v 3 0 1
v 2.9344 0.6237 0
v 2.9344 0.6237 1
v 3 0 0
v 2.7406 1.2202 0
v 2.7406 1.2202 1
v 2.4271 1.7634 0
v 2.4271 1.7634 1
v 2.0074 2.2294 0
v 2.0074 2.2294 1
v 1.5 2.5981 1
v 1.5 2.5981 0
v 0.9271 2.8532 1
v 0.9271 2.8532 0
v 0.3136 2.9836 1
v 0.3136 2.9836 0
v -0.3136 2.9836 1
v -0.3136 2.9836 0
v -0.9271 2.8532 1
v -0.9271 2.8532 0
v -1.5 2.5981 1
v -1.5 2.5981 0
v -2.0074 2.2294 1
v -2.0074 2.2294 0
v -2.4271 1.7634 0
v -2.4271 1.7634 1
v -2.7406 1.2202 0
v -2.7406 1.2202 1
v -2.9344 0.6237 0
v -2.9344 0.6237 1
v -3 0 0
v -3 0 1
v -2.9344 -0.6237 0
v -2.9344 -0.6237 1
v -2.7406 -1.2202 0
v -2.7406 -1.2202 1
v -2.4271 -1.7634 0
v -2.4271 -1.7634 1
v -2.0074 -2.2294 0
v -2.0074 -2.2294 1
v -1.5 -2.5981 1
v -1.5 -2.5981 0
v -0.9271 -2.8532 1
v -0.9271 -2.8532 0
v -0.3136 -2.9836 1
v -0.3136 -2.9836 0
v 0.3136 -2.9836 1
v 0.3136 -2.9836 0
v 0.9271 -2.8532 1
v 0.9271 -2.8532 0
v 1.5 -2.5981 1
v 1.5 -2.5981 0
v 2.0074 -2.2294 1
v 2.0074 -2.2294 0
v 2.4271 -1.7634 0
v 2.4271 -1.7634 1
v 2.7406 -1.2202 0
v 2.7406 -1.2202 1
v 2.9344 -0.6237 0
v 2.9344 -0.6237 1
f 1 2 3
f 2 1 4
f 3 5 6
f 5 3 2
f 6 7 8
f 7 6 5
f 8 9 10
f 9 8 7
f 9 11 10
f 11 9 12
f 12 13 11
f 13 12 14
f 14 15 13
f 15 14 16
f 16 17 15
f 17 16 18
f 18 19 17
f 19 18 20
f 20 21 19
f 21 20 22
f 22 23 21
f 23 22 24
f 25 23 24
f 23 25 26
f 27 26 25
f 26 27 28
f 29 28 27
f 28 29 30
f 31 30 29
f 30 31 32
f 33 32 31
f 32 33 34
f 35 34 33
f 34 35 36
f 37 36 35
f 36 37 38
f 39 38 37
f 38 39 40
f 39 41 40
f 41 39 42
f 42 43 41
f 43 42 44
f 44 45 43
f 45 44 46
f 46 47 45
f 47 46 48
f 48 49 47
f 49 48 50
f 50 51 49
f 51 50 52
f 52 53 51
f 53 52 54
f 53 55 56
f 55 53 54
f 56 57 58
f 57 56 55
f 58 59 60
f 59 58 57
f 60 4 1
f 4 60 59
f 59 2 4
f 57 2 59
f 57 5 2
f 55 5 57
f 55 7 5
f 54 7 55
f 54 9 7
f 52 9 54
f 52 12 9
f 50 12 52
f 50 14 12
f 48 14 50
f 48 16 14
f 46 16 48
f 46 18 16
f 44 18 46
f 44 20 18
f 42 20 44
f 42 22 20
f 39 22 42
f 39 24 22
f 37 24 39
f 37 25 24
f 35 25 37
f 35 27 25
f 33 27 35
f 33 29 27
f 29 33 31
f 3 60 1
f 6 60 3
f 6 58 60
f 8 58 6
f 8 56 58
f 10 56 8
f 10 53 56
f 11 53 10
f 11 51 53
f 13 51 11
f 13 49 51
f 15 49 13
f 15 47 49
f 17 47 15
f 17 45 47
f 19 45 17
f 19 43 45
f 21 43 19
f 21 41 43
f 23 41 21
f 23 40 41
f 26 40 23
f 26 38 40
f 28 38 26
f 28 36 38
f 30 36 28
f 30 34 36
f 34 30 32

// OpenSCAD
/*
 * OpenSCAD Workshop Examples
 * Copyright (c) 2013 Anar Software LLC. < http://anars.com >
 *
 * This program is free software: you can redistribute it and/or modify it under
 * the terms of the GNU General Public License as published by the Free Software
 * Foundation, either version 3 of the License, or (at your option) any later
 * version.
 *
 * This program is distributed in the hope that it will be useful, but WITHOUT
 * ANY WARRANTY; without even the implied warranty of MERCHANTABILITY or FITNESS
 * FOR A PARTICULAR PURPOSE. See the GNU General Public License for more details.
 *
 * You should have received a copy of the GNU General Public License along with
 * this program. If not, see < http://www.gnu.org/licenses/ >
 *
 */
/*

Creates 3 unit radius, 1 unit height cylinder.

Parameters :

	cylinder(r = x);

*/

$fs = 0;

cylinder(r = 3);
